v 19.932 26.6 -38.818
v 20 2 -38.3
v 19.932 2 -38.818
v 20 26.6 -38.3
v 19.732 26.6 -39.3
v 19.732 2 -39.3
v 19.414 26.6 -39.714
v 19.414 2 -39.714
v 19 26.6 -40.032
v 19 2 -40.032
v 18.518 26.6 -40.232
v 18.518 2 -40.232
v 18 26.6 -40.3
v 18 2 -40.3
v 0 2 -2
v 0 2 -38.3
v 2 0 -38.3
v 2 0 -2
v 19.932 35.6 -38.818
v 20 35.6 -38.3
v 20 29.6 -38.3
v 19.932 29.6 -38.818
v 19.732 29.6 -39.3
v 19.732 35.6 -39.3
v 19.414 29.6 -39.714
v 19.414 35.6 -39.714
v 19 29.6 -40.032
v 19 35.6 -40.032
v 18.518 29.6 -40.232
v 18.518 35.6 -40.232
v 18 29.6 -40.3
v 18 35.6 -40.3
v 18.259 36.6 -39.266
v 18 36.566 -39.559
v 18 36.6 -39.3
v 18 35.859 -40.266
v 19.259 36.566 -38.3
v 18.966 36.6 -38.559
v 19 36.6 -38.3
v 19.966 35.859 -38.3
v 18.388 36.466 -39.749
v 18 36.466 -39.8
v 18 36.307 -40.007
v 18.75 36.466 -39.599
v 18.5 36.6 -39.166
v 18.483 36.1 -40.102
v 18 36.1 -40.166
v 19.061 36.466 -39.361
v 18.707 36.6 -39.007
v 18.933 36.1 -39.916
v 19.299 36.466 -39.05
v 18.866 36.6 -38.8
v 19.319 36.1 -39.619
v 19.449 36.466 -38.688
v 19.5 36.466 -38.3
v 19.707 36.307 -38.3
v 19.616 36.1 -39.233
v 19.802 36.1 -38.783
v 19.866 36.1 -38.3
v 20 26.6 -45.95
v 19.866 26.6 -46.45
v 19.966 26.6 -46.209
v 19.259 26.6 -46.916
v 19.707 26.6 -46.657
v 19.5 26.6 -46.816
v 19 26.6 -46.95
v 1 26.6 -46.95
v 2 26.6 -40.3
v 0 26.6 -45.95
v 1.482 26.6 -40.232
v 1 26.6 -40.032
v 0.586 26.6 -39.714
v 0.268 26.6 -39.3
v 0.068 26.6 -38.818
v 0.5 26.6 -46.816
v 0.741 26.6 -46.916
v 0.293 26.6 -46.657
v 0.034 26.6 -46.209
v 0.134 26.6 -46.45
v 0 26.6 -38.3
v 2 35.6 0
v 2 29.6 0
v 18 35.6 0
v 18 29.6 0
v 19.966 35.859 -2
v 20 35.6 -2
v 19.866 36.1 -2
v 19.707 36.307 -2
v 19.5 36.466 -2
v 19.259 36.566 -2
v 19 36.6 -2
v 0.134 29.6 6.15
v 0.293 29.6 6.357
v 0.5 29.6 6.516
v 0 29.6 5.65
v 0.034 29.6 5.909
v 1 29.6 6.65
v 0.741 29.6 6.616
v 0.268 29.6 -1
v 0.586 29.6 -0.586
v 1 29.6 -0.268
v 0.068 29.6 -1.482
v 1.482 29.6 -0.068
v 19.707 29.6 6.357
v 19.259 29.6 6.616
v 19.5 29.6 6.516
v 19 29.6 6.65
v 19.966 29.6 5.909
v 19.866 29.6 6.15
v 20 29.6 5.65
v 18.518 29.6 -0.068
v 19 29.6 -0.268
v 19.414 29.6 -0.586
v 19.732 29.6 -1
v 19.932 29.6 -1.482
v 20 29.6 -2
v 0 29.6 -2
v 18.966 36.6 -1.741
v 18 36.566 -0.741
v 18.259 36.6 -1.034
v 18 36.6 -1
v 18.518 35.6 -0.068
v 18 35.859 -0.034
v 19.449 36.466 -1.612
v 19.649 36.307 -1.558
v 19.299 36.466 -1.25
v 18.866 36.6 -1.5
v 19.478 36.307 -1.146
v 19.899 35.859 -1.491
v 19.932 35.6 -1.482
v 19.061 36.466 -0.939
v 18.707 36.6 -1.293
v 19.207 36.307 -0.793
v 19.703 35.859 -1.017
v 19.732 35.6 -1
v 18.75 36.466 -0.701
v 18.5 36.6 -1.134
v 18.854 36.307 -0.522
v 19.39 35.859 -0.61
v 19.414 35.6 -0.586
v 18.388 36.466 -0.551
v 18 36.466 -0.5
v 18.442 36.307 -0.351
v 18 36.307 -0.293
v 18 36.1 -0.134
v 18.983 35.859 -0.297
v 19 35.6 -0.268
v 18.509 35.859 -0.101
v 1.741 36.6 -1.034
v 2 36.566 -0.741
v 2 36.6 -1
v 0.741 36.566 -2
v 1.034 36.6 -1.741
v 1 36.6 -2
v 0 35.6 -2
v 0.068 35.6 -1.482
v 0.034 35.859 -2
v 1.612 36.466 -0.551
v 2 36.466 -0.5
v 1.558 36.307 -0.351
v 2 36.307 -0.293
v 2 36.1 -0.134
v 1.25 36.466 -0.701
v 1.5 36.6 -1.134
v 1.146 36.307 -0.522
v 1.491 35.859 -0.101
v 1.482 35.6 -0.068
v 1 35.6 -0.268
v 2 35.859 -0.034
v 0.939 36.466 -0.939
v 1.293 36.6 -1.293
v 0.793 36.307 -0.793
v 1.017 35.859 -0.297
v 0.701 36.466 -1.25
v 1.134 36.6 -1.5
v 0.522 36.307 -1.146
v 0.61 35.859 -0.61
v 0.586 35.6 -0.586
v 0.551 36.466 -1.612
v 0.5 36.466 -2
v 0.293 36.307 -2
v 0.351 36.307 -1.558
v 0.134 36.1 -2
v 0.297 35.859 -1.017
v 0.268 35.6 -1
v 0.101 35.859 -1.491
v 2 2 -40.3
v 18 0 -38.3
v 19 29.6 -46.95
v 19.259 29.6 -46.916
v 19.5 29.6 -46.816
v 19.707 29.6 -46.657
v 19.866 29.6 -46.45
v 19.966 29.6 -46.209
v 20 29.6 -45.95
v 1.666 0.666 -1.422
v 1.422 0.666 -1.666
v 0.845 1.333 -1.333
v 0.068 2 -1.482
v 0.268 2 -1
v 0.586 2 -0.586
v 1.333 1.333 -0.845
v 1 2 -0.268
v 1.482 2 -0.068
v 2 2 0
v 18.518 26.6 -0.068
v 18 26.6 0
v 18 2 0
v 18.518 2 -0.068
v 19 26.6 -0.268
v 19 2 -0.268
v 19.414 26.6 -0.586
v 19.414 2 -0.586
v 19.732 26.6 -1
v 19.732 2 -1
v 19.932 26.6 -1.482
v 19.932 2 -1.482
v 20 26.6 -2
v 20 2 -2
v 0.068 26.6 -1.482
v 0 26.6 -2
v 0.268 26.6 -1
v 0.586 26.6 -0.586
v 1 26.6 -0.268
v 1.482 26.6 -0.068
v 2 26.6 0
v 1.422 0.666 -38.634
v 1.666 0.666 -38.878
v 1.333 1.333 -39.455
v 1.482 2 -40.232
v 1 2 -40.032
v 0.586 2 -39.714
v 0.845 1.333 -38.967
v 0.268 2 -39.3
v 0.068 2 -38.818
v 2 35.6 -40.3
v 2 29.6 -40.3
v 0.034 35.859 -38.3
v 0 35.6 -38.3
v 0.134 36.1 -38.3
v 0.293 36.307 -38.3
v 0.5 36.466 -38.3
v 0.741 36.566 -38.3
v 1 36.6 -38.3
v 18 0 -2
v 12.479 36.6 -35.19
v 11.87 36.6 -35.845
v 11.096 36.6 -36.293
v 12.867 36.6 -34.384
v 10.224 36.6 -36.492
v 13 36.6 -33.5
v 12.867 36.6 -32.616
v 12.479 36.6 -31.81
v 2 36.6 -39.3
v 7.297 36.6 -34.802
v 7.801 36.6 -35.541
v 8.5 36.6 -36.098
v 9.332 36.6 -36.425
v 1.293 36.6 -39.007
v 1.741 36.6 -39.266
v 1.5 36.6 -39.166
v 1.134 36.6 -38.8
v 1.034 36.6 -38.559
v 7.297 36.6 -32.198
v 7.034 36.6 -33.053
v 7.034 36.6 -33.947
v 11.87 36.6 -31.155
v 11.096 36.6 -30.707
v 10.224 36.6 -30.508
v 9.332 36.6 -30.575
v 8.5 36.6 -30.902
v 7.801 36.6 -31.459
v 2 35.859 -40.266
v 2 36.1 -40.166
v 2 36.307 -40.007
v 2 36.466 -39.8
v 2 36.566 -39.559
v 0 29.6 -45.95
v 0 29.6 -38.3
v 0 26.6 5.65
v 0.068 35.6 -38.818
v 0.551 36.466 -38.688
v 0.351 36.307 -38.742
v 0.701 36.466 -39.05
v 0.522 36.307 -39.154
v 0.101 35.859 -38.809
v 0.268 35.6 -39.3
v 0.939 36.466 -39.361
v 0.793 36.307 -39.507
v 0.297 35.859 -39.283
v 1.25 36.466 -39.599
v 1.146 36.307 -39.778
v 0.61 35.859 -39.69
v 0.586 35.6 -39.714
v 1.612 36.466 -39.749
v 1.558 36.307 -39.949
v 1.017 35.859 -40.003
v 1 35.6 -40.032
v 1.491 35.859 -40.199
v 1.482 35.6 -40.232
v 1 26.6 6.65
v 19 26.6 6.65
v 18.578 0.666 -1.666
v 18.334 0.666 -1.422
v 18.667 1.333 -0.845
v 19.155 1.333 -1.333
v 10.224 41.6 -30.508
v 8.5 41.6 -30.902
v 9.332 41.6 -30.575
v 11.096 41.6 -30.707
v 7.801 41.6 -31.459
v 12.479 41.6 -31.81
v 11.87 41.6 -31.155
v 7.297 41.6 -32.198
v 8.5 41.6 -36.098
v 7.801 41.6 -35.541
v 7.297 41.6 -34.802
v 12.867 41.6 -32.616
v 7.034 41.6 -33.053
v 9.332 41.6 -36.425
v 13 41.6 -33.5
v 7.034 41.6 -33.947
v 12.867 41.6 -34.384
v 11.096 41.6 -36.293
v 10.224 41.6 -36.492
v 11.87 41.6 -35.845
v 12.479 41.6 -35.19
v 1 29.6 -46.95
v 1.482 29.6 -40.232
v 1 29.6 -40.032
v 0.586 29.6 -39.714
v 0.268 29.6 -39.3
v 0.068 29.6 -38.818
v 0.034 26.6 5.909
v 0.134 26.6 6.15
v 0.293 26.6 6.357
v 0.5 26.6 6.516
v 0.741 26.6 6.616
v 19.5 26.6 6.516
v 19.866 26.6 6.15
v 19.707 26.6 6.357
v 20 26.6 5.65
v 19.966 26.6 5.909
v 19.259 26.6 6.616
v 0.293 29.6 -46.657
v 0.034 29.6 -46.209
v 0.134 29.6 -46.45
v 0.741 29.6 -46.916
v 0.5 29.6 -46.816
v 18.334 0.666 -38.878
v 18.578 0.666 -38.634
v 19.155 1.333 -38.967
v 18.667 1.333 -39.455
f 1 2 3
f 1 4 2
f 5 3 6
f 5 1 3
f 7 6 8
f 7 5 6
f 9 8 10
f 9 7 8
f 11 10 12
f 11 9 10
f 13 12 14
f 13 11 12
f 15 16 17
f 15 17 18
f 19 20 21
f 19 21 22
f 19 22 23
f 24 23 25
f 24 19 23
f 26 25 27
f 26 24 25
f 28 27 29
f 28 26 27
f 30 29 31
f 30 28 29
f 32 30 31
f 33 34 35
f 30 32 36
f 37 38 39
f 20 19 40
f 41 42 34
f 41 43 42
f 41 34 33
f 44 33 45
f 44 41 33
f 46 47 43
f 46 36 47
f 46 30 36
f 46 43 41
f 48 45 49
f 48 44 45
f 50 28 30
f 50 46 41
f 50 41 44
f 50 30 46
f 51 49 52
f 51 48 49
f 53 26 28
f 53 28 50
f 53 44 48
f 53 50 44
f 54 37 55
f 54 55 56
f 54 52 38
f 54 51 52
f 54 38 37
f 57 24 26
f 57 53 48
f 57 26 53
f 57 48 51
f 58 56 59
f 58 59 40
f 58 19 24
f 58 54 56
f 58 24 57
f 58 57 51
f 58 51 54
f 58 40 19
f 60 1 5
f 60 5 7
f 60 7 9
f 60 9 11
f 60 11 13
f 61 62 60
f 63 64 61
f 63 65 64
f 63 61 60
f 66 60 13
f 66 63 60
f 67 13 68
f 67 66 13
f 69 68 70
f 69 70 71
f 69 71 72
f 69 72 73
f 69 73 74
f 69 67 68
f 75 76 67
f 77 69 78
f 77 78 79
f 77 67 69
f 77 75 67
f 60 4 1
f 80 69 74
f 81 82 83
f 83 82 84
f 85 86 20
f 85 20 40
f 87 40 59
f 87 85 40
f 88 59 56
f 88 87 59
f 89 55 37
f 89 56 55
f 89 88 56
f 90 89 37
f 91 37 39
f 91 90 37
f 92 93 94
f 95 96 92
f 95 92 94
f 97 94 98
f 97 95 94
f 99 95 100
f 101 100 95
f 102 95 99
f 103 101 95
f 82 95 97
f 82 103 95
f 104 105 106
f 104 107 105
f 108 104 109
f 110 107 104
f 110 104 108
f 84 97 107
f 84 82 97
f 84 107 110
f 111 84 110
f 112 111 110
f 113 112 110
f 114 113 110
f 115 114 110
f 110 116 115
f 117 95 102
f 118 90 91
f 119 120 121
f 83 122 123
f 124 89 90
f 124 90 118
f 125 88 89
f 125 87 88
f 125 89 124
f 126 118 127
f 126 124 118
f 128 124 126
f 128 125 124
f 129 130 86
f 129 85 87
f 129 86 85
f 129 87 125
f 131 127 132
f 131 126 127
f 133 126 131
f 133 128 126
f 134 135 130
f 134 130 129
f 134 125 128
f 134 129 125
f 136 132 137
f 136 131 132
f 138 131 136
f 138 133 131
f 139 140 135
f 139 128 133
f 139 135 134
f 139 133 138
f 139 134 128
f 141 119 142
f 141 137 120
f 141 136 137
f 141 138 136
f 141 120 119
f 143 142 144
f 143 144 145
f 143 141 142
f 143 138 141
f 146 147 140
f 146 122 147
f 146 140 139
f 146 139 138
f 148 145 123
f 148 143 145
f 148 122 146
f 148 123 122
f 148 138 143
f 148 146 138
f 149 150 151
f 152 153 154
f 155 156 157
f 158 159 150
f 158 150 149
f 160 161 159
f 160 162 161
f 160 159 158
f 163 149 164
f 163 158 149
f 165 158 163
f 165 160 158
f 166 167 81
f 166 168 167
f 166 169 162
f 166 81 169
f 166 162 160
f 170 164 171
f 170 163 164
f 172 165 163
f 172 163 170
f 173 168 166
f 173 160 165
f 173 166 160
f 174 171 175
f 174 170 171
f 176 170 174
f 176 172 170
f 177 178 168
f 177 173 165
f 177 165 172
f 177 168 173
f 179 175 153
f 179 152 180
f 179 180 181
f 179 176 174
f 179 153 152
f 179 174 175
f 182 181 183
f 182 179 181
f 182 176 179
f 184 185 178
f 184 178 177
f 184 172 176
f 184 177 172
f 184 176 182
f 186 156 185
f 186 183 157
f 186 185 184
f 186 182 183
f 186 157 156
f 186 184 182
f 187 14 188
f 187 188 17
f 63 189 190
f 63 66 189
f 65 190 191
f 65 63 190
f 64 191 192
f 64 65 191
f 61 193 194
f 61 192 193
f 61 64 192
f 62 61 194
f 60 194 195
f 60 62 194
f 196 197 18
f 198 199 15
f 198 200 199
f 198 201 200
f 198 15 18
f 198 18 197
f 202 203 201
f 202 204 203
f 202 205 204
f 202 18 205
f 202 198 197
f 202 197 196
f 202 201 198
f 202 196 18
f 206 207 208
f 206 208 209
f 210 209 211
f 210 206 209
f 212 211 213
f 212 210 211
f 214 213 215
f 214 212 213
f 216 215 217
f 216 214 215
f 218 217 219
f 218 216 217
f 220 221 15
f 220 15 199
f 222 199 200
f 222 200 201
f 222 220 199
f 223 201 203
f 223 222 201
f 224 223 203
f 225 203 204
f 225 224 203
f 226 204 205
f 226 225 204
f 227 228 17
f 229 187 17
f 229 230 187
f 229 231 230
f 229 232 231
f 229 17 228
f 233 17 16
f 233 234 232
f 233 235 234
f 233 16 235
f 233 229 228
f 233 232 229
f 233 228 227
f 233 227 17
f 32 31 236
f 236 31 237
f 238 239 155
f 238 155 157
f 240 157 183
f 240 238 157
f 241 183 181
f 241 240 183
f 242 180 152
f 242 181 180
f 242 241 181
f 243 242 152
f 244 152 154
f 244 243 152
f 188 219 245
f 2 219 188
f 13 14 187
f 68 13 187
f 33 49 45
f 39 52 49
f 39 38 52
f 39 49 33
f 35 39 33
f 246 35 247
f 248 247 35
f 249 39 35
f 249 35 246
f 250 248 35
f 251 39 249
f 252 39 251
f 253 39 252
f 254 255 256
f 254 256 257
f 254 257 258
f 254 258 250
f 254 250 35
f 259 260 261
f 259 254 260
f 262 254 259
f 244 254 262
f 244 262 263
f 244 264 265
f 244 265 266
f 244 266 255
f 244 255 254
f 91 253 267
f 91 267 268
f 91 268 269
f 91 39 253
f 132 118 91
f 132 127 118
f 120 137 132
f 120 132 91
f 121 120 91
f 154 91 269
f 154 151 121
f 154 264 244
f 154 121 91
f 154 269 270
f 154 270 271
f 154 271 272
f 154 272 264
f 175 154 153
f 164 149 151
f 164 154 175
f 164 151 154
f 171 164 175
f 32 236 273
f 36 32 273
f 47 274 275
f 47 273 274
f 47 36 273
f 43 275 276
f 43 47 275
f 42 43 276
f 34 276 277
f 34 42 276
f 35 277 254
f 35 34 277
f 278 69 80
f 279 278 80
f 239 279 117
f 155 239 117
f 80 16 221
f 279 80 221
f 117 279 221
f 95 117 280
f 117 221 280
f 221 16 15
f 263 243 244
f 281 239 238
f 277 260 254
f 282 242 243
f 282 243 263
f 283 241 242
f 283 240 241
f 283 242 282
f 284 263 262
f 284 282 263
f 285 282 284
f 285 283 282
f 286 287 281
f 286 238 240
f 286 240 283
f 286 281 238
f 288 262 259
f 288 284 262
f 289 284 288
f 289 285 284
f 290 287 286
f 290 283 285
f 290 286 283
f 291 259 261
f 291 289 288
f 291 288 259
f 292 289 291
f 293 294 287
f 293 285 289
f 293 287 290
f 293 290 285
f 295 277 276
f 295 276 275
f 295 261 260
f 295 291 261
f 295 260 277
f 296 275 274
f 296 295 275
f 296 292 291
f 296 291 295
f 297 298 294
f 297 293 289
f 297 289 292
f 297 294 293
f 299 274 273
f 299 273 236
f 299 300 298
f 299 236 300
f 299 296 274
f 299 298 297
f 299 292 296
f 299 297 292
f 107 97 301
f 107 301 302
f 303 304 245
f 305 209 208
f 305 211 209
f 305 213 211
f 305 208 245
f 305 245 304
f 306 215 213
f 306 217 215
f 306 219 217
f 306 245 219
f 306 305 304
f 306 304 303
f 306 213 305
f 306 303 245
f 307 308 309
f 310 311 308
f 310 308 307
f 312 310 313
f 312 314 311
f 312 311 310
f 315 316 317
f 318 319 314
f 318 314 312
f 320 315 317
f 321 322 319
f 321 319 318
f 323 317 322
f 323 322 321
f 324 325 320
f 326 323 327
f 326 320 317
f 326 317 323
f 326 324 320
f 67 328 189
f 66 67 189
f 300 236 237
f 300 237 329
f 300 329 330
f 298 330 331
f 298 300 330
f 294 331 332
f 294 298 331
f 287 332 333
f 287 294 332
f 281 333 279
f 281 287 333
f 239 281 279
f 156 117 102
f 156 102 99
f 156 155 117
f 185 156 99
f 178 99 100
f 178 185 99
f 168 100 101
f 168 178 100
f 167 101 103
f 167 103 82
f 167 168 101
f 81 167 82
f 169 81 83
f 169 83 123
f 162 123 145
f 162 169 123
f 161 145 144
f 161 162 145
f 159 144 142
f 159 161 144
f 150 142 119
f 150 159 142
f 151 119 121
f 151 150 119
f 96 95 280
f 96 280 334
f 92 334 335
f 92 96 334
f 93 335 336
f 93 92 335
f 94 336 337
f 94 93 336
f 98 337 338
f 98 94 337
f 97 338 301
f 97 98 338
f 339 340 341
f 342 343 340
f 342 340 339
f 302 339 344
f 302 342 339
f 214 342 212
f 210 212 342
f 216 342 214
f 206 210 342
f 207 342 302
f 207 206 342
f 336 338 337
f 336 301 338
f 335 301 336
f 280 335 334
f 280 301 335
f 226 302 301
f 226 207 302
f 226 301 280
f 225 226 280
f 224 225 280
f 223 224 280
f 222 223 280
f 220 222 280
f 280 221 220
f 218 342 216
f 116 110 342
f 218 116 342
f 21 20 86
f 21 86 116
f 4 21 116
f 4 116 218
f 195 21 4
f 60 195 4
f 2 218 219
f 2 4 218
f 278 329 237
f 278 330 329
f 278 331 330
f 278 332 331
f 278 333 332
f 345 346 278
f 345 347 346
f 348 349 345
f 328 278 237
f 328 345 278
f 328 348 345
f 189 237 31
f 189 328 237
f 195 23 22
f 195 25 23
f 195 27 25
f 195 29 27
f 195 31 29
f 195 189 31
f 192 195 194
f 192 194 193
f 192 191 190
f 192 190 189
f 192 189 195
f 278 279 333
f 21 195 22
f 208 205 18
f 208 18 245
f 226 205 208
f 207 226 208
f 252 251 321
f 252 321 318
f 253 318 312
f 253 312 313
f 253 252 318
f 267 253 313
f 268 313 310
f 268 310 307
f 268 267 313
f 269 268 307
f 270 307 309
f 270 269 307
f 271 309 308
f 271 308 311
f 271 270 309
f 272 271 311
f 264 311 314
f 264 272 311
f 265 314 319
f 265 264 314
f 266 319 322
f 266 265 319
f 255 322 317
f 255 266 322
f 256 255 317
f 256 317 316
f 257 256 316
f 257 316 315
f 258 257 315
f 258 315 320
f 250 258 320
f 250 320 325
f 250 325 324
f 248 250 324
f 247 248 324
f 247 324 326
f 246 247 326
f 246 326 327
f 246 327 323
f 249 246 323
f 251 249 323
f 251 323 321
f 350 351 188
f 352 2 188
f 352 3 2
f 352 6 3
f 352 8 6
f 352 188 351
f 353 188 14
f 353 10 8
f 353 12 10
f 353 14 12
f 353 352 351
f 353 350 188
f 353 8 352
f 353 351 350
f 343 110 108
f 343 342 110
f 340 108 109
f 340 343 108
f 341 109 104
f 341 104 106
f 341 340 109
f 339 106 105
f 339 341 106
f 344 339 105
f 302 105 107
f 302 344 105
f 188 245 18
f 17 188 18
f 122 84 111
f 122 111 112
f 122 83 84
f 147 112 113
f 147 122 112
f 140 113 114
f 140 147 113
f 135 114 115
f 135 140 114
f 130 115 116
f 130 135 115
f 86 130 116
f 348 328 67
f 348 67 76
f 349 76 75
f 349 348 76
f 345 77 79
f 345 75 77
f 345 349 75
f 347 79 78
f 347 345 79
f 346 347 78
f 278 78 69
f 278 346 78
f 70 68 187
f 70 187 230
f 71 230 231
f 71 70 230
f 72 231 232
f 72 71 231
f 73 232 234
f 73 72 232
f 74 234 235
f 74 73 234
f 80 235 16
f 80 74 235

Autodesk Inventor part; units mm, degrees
ref_plane "YZ Plane" through (0, 0, 0) normal (1, 0, 0) x (0, 1, 0)
ref_plane "XZ Plane" through (0, 0, 0) normal (0, 1, 0) x (-1, 0, 0)
ref_plane "XY Plane" through (0, 0, 0) normal (0, 0, 1) x (1, 0, 0)
sketch "Sketch1" plane through (0, 0, 0) normal (0, 1, 0) x (-1, 0, 0)
  line L0 (0, 0) -> (-20, 0)
  line L1 (-20, 0) -> (-20, -40.3)
  line L2 (-20, -40.3) -> (0, -40.3)
  line L3 (0, -40.3) -> (0, 0)
  dimension "d0" = 20
  dimension "d1" = 40.3
extrude "Extrusion1" add sketch "Sketch1" along normal blind 36.6
fillet "Fillet1" radius 2 4 edges at (20, 18.3, 0) (0, 18.3, 0) (20, 18.3, -40.3) (0, 18.3, -40.3)
chamfer "Chamfer1" distance 2 angle 45 8 edges at (20, 0, -20.15) (19.4142, 0, -39.7142) (10, 0, -40.3) (0.5858, 0, -39.7142) (0, 0, -20.15) (0.5858, 0, -0.5858) (10, 0, 0) (19.4142, 0, -0.5858)
fillet "Fillet2" radius 1 8 edges at (19.4142, 36.6, -39.7142) (10, 36.6, -40.3) (0.5858, 36.6, -39.7142) (0, 36.6, -20.15) (0.5858, 36.6, -0.5858) (10, 36.6, 0) (19.4142, 36.6, -0.5858) (20, 36.6, -20.15)
sketch "Sketch2" plane through (0, 36.6, 0) normal (0, 1, 0) x (1, 0, 0)
  line L0 (2, 0) -> (18, 0) projected
  line L1 (18, 0) -> (2, 0) projected
  line L2 (10, 0) -> (10, 33.5)
  line L3 (10, 0) -> (43.5, 0) construction
  circle A0 centre (10, 33.5) radius 3
  point P0 (0, 0)
  dimension "d9" = 33.5
  dimension "d10" = 90
  dimension "d11" = 6
extrude "Extrusion2" add sketch "Sketch2" along normal blind 5
sketch "Sketch3" plane through (2, 2, 0) normal (0, 0, 1) x (1, 0, 0)
  line L0 (0, -2) -> (16, -2) projected
  line L1 (18, 33.6) -> (18, 0) projected
  line L2 (-2, 27.6) -> (18, 27.6)
  line L3 (18, 27.6) -> (18, 24.6)
  line L4 (18, 24.6) -> (-2, 24.6)
  line L5 (-2, 24.6) -> (-2, 27.6)
  point P0 (-2, -2)
  dimension "d14" = 3
  dimension "d15" = 26.6
extrude "Extrusion3" add sketch "Sketch3" along normal blind 6.65 and the other way blind 46.95
fillet "Fillet3" radius 1 4 edges at (20, 28.1, 6.65) (0, 28.1, 6.65) (20, 28.1, -46.95) (0, 28.1, -46.95)
properties part number "Servo"
